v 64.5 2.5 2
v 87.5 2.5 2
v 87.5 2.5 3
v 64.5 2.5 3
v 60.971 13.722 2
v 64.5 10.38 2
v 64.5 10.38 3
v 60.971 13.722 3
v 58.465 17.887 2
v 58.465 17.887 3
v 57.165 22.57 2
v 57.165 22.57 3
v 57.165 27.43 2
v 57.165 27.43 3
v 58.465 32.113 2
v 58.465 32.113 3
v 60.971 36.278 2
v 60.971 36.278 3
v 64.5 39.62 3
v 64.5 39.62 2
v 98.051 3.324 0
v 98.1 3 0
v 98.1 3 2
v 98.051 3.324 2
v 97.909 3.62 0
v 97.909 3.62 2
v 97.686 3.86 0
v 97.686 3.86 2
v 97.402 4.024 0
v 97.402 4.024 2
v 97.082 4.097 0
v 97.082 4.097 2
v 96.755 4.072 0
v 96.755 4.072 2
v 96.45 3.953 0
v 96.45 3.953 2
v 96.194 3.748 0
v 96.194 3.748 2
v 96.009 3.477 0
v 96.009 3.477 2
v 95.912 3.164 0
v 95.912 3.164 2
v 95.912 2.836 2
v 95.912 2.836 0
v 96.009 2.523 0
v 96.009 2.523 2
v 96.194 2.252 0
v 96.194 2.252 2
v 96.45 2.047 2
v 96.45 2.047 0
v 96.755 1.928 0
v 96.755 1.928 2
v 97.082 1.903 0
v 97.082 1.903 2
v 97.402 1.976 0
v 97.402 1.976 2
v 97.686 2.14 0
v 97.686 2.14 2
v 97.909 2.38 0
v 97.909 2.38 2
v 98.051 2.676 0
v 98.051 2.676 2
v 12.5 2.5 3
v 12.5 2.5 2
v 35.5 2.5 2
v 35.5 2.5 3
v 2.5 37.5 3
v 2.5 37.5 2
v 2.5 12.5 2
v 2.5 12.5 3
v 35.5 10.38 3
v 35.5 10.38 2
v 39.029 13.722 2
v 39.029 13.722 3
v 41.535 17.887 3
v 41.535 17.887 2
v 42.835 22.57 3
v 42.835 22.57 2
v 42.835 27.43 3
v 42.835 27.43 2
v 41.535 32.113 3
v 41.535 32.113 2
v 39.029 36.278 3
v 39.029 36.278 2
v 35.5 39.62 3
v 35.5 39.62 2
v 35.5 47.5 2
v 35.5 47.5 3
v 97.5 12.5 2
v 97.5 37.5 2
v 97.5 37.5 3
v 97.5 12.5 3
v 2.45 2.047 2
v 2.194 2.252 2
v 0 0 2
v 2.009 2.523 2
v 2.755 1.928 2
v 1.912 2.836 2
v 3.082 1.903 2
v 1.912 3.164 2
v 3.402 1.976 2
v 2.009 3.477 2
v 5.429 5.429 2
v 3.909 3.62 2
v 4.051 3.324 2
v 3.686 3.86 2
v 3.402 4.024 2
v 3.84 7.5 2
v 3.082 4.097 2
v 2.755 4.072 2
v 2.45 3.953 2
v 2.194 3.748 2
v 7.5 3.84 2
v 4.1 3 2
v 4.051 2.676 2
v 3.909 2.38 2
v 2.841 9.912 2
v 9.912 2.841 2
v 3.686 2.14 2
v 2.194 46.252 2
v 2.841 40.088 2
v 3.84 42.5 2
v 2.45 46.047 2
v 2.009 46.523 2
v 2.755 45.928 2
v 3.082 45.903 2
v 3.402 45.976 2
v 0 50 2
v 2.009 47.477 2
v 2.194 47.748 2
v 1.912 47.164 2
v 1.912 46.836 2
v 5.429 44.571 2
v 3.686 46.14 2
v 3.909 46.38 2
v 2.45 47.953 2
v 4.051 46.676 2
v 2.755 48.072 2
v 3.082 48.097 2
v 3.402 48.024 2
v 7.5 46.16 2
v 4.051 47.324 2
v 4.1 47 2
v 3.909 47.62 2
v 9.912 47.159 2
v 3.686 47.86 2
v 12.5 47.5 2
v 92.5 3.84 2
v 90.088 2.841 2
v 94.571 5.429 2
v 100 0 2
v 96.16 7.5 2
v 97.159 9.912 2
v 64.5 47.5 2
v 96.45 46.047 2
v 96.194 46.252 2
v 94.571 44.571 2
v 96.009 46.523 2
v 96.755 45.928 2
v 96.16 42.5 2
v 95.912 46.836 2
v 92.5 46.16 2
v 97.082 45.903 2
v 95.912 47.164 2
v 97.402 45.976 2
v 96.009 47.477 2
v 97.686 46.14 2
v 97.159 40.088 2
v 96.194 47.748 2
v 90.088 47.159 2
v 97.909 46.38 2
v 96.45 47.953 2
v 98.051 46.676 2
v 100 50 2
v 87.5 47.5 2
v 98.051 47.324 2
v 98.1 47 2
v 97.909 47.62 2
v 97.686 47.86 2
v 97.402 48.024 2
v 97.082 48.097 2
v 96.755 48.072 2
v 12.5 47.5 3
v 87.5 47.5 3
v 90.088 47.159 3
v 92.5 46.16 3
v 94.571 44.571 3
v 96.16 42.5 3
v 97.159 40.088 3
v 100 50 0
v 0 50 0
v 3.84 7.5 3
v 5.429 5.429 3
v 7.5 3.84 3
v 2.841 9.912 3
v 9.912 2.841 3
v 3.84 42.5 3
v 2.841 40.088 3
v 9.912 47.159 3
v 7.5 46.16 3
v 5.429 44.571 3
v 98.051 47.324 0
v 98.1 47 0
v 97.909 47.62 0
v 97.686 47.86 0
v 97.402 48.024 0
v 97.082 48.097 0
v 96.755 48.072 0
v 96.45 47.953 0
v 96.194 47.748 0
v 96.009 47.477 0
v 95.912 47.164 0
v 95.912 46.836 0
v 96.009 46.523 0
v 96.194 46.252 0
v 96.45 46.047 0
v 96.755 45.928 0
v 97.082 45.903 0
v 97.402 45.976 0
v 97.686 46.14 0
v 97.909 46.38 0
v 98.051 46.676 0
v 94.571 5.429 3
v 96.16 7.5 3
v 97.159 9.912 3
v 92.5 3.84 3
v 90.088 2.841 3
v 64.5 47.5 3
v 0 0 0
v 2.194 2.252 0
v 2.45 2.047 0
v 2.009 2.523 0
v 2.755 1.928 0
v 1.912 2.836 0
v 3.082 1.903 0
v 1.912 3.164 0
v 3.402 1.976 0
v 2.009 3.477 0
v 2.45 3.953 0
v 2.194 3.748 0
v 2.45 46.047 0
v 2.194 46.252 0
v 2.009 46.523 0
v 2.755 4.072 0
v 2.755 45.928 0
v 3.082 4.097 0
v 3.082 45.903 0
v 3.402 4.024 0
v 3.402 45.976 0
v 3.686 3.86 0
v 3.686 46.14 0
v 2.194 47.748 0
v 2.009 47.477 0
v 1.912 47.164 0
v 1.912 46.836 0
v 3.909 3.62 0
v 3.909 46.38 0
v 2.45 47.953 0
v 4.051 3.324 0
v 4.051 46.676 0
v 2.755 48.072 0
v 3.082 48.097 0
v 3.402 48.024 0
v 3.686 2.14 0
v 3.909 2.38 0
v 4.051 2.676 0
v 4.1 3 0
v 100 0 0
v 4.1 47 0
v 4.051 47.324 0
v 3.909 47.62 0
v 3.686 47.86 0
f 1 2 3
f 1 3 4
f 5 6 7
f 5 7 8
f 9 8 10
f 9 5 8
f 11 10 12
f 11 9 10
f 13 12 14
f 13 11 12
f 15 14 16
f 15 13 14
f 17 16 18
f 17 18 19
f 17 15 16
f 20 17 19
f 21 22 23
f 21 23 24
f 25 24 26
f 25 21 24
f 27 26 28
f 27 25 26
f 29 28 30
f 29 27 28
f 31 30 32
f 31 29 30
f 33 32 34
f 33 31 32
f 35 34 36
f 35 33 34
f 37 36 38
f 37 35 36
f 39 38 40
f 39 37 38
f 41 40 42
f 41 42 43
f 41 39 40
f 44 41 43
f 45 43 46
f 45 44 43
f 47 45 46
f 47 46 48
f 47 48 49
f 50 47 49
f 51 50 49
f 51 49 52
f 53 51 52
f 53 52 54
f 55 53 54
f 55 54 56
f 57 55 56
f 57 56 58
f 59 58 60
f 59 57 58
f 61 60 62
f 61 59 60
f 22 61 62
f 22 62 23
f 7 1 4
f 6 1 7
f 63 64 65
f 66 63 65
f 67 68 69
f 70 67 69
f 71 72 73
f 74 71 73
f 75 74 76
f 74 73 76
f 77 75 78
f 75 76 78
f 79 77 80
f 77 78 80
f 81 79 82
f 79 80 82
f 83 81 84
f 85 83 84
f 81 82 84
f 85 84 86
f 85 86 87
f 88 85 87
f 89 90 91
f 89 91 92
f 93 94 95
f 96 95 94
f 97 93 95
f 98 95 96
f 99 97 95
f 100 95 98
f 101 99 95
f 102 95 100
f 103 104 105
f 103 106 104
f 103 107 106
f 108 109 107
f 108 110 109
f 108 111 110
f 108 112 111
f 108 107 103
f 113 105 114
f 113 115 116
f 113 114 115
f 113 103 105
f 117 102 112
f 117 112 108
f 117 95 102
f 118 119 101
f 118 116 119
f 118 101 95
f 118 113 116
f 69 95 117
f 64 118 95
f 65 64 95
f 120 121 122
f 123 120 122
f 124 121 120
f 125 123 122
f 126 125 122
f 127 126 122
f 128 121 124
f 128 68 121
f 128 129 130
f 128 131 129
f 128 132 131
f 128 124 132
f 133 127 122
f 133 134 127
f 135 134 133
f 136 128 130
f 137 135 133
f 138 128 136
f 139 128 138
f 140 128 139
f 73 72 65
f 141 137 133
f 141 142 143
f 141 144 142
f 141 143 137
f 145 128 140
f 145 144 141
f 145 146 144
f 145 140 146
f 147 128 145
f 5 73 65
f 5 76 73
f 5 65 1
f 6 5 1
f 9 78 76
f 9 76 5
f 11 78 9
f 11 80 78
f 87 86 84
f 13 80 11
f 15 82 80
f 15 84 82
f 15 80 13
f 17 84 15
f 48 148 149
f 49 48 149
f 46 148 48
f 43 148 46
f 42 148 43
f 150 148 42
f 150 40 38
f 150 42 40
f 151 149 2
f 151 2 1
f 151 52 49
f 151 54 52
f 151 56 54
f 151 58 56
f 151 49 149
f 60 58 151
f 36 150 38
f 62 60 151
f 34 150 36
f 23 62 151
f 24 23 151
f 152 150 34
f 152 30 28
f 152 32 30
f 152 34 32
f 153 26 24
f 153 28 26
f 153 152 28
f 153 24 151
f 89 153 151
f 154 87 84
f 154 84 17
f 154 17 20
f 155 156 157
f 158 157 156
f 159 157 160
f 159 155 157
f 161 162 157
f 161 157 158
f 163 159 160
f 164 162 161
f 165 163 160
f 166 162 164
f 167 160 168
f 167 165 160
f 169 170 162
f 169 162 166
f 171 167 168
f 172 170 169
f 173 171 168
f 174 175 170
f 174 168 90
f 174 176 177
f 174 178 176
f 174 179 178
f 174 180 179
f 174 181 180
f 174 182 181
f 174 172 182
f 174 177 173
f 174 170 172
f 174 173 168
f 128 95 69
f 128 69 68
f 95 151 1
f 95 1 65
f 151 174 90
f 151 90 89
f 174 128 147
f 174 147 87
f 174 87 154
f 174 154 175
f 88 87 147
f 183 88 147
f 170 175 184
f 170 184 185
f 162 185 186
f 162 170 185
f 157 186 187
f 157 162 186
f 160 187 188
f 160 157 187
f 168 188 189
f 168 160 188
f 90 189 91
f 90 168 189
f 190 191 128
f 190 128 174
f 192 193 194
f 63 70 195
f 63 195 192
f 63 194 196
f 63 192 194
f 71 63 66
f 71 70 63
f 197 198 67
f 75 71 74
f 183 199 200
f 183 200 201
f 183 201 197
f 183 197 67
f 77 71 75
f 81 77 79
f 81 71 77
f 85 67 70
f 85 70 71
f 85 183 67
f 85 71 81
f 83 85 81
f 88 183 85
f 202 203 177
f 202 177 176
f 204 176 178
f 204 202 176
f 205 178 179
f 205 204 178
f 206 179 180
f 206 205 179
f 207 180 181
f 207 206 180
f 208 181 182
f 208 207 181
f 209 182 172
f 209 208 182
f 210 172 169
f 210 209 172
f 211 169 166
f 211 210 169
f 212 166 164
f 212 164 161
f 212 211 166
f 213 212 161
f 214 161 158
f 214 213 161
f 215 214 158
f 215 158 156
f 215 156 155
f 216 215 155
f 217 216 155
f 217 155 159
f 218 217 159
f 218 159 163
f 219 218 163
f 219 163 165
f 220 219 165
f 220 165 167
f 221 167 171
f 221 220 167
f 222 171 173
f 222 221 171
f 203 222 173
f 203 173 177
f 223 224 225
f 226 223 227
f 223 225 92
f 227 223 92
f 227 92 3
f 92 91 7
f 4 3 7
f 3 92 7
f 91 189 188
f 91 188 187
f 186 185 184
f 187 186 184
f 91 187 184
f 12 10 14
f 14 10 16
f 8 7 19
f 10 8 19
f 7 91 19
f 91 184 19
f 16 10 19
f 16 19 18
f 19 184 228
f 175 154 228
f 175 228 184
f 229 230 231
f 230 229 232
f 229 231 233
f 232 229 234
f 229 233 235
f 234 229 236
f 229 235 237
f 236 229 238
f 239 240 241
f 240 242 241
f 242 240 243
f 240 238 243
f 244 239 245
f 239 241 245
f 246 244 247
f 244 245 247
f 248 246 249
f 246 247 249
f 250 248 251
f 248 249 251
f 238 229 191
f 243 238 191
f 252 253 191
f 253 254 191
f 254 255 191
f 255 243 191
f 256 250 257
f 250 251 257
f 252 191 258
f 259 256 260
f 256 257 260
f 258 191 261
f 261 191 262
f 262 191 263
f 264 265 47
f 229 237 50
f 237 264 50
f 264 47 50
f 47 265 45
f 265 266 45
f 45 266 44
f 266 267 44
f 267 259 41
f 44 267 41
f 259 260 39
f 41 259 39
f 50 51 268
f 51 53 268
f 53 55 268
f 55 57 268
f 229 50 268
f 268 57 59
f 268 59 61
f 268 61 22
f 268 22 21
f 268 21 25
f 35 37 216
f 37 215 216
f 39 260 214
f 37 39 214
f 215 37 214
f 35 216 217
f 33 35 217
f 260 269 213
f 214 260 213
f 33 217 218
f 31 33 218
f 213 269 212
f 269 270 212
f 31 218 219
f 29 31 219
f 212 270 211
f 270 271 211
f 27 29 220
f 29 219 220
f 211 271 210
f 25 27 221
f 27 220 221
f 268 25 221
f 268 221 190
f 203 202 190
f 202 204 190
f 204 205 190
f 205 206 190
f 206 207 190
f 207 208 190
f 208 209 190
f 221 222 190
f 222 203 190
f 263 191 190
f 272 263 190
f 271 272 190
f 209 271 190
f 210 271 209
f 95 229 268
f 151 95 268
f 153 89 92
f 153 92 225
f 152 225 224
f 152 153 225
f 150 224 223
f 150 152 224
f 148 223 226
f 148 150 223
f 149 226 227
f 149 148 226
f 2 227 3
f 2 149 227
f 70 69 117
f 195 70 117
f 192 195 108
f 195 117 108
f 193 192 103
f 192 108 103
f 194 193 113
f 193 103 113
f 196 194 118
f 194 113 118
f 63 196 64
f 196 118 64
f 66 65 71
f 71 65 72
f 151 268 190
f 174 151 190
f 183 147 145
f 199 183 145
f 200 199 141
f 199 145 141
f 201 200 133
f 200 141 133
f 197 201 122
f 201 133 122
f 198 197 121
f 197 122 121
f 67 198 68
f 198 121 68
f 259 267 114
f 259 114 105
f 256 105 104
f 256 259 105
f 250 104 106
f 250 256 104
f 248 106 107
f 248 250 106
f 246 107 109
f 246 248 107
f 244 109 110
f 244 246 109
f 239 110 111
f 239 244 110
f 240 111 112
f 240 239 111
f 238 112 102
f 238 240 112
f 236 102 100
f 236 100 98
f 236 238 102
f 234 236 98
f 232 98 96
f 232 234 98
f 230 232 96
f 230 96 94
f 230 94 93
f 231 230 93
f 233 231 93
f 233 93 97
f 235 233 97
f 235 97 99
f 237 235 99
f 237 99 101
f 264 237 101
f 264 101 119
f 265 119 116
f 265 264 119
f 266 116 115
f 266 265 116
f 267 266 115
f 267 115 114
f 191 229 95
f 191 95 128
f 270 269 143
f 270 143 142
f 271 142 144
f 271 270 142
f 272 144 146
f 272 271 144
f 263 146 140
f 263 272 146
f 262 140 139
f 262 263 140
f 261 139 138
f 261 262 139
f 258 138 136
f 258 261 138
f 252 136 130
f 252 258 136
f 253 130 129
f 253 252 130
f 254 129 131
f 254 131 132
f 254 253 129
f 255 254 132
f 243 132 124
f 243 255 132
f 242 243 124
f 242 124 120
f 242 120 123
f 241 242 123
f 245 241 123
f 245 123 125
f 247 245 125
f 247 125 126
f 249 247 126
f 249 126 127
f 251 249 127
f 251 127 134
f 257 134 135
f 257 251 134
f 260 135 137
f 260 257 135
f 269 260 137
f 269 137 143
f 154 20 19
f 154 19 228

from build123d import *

# Parameters (mm, degrees)
ESQUISSE1_W        = 100
ESQUISSE1_H        = 50
ESQUISSE1_R        = 1.1
BOSS_EXTRU_1_DEPTH = 2
BOSS_EXTRU_2_DEPTH = 1


with BuildPart() as part:
    # Esquisse1 → Boss.-Extru.1 (new body)
    with BuildSketch(Plane.XY):
        with Locations((50, 25)):
            Rectangle(ESQUISSE1_W, ESQUISSE1_H)
        with Locations((3, 47)):
            Circle(ESQUISSE1_R, mode=Mode.SUBTRACT)
        with Locations((97, 47)):
            Circle(ESQUISSE1_R, mode=Mode.SUBTRACT)
        with Locations((3, 3)):
            Circle(ESQUISSE1_R, mode=Mode.SUBTRACT)
        with Locations((97, 3)):
            Circle(ESQUISSE1_R, mode=Mode.SUBTRACT)
    extrude(amount=BOSS_EXTRU_1_DEPTH)

    # Esquisse2 → Boss.-Extru.2 (add)
    with BuildSketch(Plane.XY.offset(2)):
        with BuildLine():
            Line((2.5, 37.5), (2.5, 12.5))
            ThreePointArc((2.5, 12.5), (5.428932188, 5.428932188), (12.5, 2.5))
            Line((12.5, 2.5), (35.5, 2.5))
            Line((35.5, 2.5), (35.5, 10.379808483))
            ThreePointArc((35.5, 10.379808483), (43, 25), (35.5, 39.620191517))
            Line((35.5, 39.620191517), (35.5, 47.5))
            Line((35.5, 47.5), (12.5, 47.5))
            ThreePointArc((12.5, 47.5), (5.428932188, 44.571067812), (2.5, 37.5))
        make_face()
        with BuildLine():
            Line((64.5, 39.620191517), (64.5, 47.5))
            Line((64.5, 47.5), (87.5, 47.5))
            ThreePointArc((87.5, 47.5), (94.571067812, 44.571067812), (97.5, 37.5))
            Line((97.5, 37.5), (97.5, 12.5))
            ThreePointArc((97.5, 12.5), (94.571067812, 5.428932188), (87.5, 2.5))
            Line((87.5, 2.5), (64.5, 2.5))
            Line((64.5, 2.5), (64.5, 10.379808483))
            ThreePointArc((64.5, 10.379808483), (57, 25), (64.5, 39.620191517))
        make_face()
    extrude(amount=BOSS_EXTRU_2_DEPTH)


solid = part.part
